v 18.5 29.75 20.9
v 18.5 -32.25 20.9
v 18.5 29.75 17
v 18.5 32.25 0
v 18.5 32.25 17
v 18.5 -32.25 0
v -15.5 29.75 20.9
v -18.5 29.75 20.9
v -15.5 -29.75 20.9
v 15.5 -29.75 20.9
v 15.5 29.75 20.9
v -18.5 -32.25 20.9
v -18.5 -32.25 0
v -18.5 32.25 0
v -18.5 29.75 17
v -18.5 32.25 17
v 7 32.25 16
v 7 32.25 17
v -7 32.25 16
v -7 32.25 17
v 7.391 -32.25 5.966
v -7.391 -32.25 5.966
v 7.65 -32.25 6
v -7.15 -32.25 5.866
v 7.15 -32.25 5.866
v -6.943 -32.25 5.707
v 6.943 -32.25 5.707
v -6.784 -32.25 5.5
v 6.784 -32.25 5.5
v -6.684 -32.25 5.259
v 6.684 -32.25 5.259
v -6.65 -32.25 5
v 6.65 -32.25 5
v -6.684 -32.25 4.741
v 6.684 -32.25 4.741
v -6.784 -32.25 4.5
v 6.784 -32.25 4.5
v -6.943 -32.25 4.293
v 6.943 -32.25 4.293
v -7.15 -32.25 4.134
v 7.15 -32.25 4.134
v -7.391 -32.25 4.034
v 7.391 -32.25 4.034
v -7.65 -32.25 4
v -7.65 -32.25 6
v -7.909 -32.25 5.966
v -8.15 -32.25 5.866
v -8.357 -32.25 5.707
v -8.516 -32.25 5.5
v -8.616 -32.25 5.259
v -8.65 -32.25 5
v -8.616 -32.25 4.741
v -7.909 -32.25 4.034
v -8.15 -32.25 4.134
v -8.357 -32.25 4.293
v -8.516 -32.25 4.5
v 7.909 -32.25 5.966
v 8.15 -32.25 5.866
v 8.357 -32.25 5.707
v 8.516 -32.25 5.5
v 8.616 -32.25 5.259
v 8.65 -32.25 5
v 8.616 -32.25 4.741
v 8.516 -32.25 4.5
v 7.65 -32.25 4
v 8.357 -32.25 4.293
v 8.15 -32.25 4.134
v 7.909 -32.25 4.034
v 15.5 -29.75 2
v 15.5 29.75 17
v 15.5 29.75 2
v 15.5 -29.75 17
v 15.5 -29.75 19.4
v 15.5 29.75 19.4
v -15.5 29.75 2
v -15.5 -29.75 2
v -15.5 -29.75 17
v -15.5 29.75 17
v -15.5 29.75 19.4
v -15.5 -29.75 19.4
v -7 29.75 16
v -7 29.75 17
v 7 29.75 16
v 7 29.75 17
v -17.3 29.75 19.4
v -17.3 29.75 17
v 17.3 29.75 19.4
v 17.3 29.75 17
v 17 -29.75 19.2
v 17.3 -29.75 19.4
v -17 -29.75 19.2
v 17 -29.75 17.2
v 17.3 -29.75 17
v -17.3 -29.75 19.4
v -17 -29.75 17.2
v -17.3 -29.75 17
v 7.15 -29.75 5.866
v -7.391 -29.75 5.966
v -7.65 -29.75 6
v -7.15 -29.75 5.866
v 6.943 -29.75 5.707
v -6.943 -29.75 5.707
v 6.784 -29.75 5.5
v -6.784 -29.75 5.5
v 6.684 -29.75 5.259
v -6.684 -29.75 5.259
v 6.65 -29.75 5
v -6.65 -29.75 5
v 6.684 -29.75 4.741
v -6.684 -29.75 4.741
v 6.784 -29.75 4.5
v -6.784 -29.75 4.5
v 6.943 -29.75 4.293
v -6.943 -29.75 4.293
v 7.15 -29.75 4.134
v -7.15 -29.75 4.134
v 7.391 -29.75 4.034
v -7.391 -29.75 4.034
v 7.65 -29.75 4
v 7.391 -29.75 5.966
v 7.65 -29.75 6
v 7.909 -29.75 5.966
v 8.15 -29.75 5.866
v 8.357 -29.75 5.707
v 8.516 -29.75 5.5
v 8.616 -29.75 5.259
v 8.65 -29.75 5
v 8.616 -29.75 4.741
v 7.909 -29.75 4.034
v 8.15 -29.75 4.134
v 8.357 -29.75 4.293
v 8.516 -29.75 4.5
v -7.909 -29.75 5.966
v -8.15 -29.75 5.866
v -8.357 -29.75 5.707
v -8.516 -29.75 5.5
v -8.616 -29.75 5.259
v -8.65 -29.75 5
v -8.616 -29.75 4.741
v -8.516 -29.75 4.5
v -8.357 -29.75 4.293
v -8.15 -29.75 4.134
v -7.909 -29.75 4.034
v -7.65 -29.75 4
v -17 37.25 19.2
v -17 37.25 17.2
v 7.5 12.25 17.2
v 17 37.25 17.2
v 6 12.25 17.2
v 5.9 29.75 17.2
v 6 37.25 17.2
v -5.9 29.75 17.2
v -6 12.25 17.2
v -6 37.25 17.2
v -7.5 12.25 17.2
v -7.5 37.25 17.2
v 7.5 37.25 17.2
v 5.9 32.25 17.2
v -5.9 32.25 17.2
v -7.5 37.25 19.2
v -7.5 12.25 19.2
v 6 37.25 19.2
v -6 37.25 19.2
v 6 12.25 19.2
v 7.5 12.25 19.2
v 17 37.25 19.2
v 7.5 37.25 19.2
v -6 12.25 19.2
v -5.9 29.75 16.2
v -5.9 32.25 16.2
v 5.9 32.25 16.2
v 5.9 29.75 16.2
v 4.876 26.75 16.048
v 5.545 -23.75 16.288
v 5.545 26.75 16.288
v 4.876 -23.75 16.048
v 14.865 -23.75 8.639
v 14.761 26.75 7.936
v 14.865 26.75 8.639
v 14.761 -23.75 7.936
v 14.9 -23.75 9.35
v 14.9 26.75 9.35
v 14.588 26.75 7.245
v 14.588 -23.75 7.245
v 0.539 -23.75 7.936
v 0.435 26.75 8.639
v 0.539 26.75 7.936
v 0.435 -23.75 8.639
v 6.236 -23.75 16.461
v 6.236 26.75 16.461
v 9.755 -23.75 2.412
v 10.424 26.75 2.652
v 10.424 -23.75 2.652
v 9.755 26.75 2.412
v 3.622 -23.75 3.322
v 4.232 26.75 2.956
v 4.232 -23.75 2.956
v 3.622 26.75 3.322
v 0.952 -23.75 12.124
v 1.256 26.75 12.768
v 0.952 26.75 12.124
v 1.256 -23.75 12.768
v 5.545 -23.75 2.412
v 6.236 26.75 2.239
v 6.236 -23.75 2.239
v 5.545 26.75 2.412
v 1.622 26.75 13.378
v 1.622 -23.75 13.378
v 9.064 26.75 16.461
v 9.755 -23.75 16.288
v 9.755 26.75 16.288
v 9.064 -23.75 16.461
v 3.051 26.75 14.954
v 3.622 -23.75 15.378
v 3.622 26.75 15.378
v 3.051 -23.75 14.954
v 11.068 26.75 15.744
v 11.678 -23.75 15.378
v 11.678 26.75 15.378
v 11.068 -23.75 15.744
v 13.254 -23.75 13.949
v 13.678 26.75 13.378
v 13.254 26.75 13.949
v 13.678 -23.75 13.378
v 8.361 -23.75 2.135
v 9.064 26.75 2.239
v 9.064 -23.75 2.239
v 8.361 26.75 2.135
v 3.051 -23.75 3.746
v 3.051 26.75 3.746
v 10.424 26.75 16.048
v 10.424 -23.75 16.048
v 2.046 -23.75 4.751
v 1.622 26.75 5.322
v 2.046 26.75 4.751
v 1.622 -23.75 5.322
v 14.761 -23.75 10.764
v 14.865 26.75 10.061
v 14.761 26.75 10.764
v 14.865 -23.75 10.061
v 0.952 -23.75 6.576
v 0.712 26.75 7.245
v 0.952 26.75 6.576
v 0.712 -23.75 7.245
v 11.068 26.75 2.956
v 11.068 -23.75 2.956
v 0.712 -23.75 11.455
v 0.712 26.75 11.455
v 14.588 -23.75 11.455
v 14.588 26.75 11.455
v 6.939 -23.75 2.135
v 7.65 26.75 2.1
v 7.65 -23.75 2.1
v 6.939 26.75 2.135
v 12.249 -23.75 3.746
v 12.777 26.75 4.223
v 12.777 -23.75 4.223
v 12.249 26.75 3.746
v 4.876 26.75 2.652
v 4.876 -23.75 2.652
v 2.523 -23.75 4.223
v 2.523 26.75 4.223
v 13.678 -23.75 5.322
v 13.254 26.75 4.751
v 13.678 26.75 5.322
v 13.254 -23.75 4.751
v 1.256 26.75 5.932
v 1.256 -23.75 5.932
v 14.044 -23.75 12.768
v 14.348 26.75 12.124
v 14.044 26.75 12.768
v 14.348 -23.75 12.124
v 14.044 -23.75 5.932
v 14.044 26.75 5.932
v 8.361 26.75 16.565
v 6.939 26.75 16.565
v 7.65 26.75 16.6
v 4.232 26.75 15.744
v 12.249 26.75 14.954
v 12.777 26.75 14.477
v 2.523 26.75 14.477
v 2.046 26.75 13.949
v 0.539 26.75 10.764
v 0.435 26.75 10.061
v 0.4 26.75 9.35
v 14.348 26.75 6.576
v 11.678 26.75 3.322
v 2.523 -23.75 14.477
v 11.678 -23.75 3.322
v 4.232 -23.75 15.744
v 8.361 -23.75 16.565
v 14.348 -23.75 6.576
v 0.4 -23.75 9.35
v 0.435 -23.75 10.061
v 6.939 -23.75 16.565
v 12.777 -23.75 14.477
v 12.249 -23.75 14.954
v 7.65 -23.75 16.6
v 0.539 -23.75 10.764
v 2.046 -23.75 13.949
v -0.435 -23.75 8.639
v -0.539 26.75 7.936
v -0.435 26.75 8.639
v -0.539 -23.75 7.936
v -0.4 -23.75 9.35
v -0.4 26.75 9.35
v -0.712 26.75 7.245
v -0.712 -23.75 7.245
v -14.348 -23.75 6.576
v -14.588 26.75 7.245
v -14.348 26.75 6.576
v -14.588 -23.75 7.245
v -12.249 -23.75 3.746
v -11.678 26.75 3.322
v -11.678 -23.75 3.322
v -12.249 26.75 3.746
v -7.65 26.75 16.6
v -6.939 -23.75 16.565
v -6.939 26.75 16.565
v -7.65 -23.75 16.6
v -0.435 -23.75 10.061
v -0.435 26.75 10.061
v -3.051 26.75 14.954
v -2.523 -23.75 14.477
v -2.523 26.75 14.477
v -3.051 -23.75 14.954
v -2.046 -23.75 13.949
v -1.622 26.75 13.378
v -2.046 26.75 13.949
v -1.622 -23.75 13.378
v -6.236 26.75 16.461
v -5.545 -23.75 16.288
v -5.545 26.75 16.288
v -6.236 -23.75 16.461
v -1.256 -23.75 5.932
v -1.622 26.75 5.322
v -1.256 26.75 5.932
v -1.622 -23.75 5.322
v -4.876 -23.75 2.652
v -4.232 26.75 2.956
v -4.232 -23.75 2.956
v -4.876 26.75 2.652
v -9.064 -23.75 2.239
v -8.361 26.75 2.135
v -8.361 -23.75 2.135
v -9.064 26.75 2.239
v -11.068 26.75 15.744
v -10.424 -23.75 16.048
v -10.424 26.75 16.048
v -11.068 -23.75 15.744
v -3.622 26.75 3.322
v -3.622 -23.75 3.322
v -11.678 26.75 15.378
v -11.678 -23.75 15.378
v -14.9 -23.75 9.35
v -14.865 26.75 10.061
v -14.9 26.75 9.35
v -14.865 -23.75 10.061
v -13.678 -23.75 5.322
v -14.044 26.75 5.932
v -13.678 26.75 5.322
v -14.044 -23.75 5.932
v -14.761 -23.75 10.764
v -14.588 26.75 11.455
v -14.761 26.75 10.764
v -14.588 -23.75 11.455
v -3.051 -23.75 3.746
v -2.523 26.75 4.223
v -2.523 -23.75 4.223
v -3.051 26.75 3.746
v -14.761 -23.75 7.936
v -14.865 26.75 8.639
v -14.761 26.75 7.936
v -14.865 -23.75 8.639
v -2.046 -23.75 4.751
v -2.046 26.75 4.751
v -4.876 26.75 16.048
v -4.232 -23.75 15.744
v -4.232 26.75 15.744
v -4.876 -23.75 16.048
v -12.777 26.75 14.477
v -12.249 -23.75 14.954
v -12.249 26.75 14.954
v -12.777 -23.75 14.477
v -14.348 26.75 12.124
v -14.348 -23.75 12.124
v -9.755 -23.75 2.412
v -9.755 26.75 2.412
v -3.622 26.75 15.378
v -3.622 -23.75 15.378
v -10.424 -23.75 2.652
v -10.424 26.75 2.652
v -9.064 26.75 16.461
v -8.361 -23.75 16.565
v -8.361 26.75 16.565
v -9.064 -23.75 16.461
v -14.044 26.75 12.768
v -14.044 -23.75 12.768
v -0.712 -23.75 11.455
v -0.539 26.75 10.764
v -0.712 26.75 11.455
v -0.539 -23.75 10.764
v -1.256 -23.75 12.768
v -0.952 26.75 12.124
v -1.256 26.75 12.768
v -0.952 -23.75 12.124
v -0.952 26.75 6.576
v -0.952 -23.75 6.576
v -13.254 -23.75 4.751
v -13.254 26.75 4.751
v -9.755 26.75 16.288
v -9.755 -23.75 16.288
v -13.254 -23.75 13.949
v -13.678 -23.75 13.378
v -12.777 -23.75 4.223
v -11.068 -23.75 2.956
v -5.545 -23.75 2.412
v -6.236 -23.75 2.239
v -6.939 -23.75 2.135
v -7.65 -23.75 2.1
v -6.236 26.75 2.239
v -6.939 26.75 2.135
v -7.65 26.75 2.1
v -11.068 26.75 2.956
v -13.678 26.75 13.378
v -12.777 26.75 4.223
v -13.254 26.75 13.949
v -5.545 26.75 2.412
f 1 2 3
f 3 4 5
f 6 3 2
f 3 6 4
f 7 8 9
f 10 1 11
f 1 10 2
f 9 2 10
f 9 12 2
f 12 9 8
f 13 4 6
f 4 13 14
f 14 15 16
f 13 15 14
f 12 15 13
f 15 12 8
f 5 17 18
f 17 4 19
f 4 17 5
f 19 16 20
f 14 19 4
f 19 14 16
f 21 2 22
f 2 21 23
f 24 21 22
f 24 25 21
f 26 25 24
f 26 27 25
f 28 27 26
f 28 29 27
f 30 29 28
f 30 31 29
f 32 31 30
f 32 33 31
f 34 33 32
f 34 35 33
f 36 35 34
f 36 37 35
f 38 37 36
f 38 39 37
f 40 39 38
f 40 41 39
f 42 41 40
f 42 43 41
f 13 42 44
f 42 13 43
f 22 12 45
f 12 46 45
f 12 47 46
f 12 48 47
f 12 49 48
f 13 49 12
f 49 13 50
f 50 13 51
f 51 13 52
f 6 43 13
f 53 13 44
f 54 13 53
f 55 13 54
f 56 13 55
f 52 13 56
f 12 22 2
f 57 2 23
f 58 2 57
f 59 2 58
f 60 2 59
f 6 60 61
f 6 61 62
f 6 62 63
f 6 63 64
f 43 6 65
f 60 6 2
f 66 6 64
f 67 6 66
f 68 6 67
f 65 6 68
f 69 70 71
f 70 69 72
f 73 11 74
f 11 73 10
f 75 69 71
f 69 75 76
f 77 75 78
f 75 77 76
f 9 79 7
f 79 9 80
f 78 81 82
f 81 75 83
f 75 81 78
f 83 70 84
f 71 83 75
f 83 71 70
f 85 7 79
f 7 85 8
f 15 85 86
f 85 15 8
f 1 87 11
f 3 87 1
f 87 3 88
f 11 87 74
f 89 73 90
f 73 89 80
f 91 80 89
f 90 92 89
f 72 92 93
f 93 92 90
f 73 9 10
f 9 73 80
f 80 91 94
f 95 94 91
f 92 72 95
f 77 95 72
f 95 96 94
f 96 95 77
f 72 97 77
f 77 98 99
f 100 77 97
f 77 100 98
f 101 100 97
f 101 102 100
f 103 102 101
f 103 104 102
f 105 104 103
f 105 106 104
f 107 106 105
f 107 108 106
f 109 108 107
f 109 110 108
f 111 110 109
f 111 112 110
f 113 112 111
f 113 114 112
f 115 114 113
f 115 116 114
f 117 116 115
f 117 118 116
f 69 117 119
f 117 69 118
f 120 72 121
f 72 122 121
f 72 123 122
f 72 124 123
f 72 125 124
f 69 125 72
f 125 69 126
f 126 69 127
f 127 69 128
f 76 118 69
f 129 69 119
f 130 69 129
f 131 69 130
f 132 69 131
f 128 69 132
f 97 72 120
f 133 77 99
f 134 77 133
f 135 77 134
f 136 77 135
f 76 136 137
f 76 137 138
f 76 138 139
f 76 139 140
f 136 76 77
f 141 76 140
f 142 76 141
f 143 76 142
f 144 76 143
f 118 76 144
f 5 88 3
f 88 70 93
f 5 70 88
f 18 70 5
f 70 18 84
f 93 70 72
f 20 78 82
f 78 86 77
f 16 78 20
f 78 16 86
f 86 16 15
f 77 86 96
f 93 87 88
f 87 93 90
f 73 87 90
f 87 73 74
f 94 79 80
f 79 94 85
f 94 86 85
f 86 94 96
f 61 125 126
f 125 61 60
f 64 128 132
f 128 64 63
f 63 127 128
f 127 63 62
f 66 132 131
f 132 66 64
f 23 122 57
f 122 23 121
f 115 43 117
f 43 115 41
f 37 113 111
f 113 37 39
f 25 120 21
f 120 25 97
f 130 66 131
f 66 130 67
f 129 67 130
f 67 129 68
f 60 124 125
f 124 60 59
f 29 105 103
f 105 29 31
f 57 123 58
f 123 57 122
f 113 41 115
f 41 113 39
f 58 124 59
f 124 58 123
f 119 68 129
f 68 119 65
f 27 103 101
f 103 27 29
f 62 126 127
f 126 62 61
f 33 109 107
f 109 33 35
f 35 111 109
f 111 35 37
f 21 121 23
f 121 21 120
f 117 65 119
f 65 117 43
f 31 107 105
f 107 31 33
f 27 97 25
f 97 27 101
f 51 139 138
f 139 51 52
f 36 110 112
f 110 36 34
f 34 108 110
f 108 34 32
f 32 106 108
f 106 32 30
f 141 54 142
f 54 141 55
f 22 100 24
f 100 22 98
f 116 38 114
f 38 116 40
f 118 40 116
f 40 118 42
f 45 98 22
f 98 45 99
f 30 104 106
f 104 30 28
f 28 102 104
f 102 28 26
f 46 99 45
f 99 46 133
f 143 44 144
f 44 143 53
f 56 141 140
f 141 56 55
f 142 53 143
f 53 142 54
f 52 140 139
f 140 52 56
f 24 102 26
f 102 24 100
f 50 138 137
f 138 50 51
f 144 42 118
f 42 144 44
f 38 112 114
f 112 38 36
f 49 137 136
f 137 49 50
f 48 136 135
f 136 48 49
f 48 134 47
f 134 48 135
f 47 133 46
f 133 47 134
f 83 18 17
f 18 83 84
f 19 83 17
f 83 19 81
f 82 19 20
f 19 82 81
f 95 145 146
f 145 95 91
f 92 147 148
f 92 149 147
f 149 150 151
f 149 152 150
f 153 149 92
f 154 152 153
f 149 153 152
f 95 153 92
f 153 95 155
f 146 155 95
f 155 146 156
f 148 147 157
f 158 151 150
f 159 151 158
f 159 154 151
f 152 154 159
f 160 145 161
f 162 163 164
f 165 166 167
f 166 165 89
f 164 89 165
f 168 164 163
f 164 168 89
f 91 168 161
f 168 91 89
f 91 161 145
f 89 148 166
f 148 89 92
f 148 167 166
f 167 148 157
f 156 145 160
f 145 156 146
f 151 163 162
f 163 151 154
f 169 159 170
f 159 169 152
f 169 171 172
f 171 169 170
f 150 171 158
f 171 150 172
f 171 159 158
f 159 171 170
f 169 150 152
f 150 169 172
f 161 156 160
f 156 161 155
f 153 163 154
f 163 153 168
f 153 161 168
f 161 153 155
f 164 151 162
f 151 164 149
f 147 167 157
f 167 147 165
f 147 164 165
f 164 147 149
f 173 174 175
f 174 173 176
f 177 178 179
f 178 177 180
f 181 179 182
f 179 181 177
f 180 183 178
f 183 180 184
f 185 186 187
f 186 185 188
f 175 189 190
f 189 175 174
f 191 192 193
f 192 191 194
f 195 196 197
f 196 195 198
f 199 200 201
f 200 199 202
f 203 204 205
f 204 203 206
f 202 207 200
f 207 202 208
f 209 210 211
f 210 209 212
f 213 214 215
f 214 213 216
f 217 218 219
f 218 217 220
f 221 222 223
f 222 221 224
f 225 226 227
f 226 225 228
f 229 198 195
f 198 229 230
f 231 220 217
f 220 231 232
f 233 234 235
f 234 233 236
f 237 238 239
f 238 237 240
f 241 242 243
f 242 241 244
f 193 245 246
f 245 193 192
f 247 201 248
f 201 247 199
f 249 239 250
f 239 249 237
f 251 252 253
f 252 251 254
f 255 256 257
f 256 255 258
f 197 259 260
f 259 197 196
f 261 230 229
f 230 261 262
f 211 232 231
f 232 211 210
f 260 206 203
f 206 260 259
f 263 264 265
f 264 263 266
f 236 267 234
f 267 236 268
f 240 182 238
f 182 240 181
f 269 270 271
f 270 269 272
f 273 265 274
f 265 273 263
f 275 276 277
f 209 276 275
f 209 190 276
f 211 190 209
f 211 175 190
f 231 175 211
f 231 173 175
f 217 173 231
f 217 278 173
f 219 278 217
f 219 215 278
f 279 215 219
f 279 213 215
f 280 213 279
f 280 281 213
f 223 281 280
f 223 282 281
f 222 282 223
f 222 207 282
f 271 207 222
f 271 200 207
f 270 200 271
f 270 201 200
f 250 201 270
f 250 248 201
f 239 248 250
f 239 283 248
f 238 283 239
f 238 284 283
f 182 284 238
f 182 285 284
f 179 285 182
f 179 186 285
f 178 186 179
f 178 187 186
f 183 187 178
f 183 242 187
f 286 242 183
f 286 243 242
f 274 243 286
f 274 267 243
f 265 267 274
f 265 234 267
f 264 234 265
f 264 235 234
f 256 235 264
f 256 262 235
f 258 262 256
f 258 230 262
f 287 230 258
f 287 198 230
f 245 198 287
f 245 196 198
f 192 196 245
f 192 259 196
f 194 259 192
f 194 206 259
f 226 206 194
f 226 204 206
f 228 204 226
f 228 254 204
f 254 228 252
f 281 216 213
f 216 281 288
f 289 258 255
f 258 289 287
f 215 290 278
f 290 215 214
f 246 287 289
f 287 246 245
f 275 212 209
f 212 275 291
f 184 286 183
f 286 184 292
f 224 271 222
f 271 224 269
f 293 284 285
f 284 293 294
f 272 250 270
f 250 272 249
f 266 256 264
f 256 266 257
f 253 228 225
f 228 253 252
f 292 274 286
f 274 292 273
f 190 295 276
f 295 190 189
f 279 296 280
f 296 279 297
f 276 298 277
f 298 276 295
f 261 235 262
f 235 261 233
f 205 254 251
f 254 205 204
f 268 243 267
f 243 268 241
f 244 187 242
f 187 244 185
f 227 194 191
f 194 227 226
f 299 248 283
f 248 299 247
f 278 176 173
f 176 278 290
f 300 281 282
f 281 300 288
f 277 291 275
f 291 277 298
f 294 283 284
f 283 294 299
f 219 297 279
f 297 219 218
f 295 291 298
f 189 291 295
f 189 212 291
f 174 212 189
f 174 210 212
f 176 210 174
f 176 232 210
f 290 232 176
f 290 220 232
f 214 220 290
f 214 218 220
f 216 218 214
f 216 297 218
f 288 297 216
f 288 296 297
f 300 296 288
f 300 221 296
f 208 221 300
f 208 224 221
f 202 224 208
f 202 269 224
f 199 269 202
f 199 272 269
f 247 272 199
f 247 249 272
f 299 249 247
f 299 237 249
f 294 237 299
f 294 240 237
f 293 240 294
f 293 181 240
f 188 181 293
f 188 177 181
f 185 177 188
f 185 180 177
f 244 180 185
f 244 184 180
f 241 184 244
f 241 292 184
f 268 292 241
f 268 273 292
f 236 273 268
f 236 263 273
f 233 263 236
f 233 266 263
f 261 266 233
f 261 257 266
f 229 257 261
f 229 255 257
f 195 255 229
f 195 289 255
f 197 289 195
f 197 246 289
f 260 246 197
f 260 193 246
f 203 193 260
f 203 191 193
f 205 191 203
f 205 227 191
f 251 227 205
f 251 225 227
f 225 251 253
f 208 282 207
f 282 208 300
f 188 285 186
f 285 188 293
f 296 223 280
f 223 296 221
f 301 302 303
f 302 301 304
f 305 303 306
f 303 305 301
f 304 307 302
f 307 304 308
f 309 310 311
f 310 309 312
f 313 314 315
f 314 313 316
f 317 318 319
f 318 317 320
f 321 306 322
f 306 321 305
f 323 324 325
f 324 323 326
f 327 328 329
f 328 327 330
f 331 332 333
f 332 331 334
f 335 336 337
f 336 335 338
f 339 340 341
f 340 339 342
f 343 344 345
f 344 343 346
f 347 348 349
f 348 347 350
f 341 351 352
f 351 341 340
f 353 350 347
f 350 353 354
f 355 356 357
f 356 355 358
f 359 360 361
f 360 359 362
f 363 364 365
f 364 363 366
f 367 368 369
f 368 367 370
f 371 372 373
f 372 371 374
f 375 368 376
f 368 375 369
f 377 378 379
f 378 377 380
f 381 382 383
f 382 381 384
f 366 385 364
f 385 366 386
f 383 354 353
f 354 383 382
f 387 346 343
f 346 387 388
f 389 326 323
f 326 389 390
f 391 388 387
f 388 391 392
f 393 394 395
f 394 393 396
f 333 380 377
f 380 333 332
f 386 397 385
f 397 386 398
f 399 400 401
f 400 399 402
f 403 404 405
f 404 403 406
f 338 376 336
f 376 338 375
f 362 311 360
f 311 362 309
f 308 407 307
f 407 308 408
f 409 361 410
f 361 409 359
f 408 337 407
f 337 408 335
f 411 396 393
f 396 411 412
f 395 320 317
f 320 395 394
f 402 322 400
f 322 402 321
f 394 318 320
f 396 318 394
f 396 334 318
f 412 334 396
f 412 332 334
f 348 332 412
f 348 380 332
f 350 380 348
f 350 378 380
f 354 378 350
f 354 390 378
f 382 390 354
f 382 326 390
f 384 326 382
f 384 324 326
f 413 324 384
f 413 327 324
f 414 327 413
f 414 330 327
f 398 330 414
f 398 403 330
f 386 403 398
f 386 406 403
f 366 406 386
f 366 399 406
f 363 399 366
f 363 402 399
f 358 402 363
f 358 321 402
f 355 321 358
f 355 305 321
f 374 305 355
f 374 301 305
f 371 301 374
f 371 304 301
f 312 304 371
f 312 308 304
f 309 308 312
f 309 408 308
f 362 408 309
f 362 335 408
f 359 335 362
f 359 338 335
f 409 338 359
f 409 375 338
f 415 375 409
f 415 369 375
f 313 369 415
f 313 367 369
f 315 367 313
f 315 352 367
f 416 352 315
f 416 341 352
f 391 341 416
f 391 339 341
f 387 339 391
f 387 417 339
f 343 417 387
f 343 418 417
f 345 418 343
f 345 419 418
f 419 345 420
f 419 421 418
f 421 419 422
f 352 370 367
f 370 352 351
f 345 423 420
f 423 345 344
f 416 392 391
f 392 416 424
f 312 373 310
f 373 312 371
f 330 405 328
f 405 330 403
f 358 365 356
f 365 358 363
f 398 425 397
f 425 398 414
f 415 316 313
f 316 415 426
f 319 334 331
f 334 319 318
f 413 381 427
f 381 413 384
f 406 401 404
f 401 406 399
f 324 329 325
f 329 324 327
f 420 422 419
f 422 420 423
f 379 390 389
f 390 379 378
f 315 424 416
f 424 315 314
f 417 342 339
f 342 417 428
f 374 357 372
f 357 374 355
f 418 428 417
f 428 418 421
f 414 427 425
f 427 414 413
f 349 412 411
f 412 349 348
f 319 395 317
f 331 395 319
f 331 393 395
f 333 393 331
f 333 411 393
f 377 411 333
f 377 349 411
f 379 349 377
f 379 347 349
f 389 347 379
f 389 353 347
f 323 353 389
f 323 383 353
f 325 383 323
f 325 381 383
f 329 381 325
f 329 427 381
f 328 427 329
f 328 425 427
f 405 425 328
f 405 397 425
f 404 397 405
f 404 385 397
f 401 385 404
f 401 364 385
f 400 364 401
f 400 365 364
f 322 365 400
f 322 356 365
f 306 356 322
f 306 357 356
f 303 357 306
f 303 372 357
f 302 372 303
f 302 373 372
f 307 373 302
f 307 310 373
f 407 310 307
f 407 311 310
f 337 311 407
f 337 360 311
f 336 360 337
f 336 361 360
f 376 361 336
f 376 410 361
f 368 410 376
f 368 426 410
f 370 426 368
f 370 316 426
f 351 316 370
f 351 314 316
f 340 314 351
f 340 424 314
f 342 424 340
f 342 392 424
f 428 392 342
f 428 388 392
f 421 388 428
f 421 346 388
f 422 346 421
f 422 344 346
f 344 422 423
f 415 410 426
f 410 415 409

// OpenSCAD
/* Holder for two AA batteries with sliding cover.
   PLA, 0.4mm nozzle, no supports. Units mm.
   Print orientation: +Z up, parts rest on min z.
*/

// ---------- parameters ----------
battery_d = 14.5;
battery_l = 50.5;
side_gap = 0.6;      // battery side to wall
mid_gap = 0.8;       // between batteries
Wi = 2*battery_d + mid_gap + 2*side_gap; // 31.0 interior width
Li = battery_l + 3 + 6;                  // 59.5 interior length
floor_t = 2.0;
side_t = 3.0;
end_t = 2.5;
Wext = Wi + 2*side_t;   // 37
Lext = Li + 2*end_t;    // 64.5
wall_top = 20.9;
low_top = 17.0;
groove_bottom = 17.0;
groove_h = 2.4;
groove_top = groove_bottom + groove_h; // 19.4
groove_depth = 1.8;
engage = 1.5;
Wc = Wi + 2*engage;     // 34 cover width
Lc0 = Lext;             // 64.5 main length
lip_len = 5.0;
Lc = Lc0 + lip_len;     // 69.5 total cover length
y0b = -Lext/2;          // -32.25 base min y
y1b = Lext/2;           // 32.25 base max y
y0c = -Lext/2;          // -32.25 cover min y
y1c = Lext/2 + lip_len; // 37.25 cover max y
tc = 2.0;
finger_w = 12;
slot_w = 1.5;
finger_y0 = 12.25;
tooth_w = 11.8;
tooth_yl = 2.5;
tooth_y0 = 29.75;
tooth_y1 = tooth_y0 + tooth_yl; // 32.25
tooth_h = 1.0;
notch_hw = 7;
notch_y0 = 29.65;
notch_y1 = 32.35;
notch_bot = 16.0;
bx = battery_d/2 + mid_gap/2; // 7.65 battery center x
battery_y0 = -Li/2 + 6;       // -23.75 spring side
battery_y1 = battery_y0 + battery_l; // 26.75
battery_yc = (battery_y0 + battery_y1)/2; // 1.5
battery_zc = floor_t + battery_d/2 + 0.1; // 9.35 slight lift
wire_z = 5;
wire_r = 1.0;

part = "assembly"; // [base, cover, assembly]
cadverify_only = "";
module instance(name, part, unit = 1) {
    echo(cadverify_instance = [name, part, unit]);
    if (cadverify_only == "" || cadverify_only == name) children();
}

module battery() {
    rotate([-90,0,0])
        cylinder(d=battery_d, h=battery_l, center=true, $fn=64);
}

module base() {
    difference() {
        // outer solid
        translate([-Wext/2, y0b, 0])
            cube([Wext, Lext, wall_top]);
        // interior cavity open at top
        translate([-Wi/2, -Li/2, floor_t])
            cube([Wi, Li, wall_top - floor_t + 1]);
        // low end wall cut (+Y end)
        translate([-Wext/2, Li/2, low_top])
            cube([Wext, Lext/2 - Li/2 + 0.5, wall_top - low_top + 1]);
        // left groove
        translate([Wi/2, -Li/2, groove_bottom])
            cube([groove_depth, Li/2 + Lext/2 + 0.5, groove_h]);
        // right groove
        translate([-Wi/2 - groove_depth, -Li/2, groove_bottom])
            cube([groove_depth, Li/2 + Lext/2 + 0.5, groove_h]);
        // wire holes through spring (-Y) wall
        translate([bx, y0b - 1, wire_z])
            rotate([-90,0,0])
                cylinder(r=wire_r, h=end_t + 2, $fn=24);
        translate([-bx, y0b - 1, wire_z])
            rotate([-90,0,0])
                cylinder(r=wire_r, h=end_t + 2, $fn=24);
        // latch notch in low wall top
        translate([-notch_hw, notch_y0, notch_bot])
            cube([2*notch_hw, notch_y1 - notch_y0, low_top - notch_bot + 0.02]);
    }
}

module cover() {
    // print orientation: plate 0..tc, tooth on top tc..tc+tooth_h
    difference() {
        union() {
            translate([-Wc/2, y0c, 0])
                cube([Wc, Lc, tc]);
            // latch tooth on top (becomes bottom after flip)
            translate([-tooth_w/2, tooth_y0, tc])
                cube([tooth_w, tooth_yl, tooth_h]);
        }
        // finger slots, open at +Y lip end
        translate([finger_w/2, finger_y0, -0.5])
            cube([slot_w, y1c - finger_y0 + 0.5, tc + 1.5]);
        translate([-finger_w/2 - slot_w, finger_y0, -0.5])
            cube([slot_w, y1c - finger_y0 + 0.5, tc + 1.5]);
    }
}

module assembly() {
    instance("base", "base", 1) base();
    instance("battery_left", "external", 1)
        translate([bx, battery_yc, battery_zc]) battery();
    instance("battery_right", "external", 1)
        translate([-bx, battery_yc, battery_zc]) battery();
    // cover printed upside-down: rotate 180 about Y then lift
    instance("cover", "cover", 1)
        translate([0, 0, 19.2]) rotate([0,180,0]) cover();
}

// ---------- specs ----------
if (part == "base") {
    echo(cadverify_spec = [
        ["bounds", [[-Wext/2, y0b, 0], [Wext/2, y1b, wall_top]]],
        ["bodies", 1],
        ["through_holes", 2],
        ["support_faces", [["bottom", "-z", 2000]]],
        ["overhangs_allowed", [
            ["groove ceilings bridge 3.6mm", [[Wi/2 - 0.6, -Li/2 - 0.5, groove_bottom - 0.5], [Wi/2 + groove_depth + 0.5, y1b + 0.2, groove_top + 0.6]]],
            ["groove ceilings bridge 3.6mm", [[-Wi/2 - groove_depth - 0.5, -Li/2 - 0.5, groove_bottom - 0.5], [-Wi/2 + 0.6, y1b + 0.2, groove_top + 0.6]]],
            ["wire holes 2mm dia bridges", [[-10, y0b - 0.5, wire_z - 1.5], [10, -Li/2 + 0.5, wire_z + 1.5]]]
        ]],
        ["copies", 1],
        ["details", [
            ["cavity", "void", [[-Wi/2, -Li/2, floor_t], [Wi/2, Li/2, 17]], 0.9],
            ["spring_room", "void", [[-Wi/2, -Li/2, floor_t], [Wi/2, -Li/2 + 6, 16.6]], 0.9],
            ["pos_room", "void", [[-Wi/2, Li/2 - 3, floor_t], [Wi/2, Li/2, 16.6]], 0.9],
            ["groove_left", "void", [[Wi/2, -Li/2, groove_bottom], [Wi/2 + groove_depth, y1b, groove_top]], 0.85],
            ["groove_right", "void", [[-Wi/2 - groove_depth, -Li/2, groove_bottom], [-Wi/2, y1b, groove_top]], 0.85],
            ["notch", "void", [[-notch_hw, notch_y0, notch_bot], [notch_hw, notch_y1, low_top + 0.02]], 0.85],
            ["wire1", "hole", [bx, y0b - 1, wire_z], [0, 1, 0], [[0, 2], [2, 2]]],
            ["wire2", "hole", [-bx, y0b - 1, wire_z], [0, 1, 0], [[0, 2], [2, 2]]],
            ["floor", "thickness", [0, 0, -1], [0, 0, 1], 2.0],
            ["side_wall", "thickness", [Wext/2 + 1, 0, 18.2], [-1, 0, 0], 1.2],
            ["end_wall", "thickness", [0, y1b + 1, 10], [0, -1, 0], 2.5]
        ]]
    ]);
    base();
} else if (part == "cover") {
    echo(cadverify_spec = [
        ["bounds", [[-Wc/2, y0c, 0], [Wc/2, y1c, tc + tooth_h]]],
        ["bodies", 1],
        ["through_holes", 0],
        ["support_faces", [["bottom", "-z", 1500]]],
        ["overhangs_allowed", []],
        ["copies", 1],
        ["details", [
            ["plate", "thickness", [0, -10, -1], [0, 0, 1], 2.0],
            ["finger", "material", [[-finger_w/2, finger_y0, 0], [finger_w/2, y1c, tc]], 0.85],
            ["slot_left", "void", [[finger_w/2, finger_y0, -0.5], [finger_w/2 + slot_w, y1c + 0.01, tc + 0.5]], 0.85],
            ["slot_right", "void", [[-finger_w/2 - slot_w, finger_y0, -0.5], [-finger_w/2, y1c + 0.01, tc + 0.5]], 0.85],
            ["tooth", "material", [[-tooth_w/2, tooth_y0, tc], [tooth_w/2, tooth_y1, tc + tooth_h]], 0.85],
            ["lip", "material", [[-Wc/2, y1b, 0], [Wc/2, y1c, tc]], 0.9]
        ]]
    ]);
    cover();
} else if (part == "assembly") {
    echo(cadverify_spec = [
        ["bounds", [[-Wext/2, y0b, 0], [Wext/2, y1c, wall_top]]],
        ["support_faces", [["bottom", "-z", 2000]]],
        ["allowed_interferences", []],
        ["motions", [
            ["slide_cover", ["cover"], "slide", [0, 1, 0], [0, 50], ["flex", [["cover", "base", 1.0, "latch tooth rides over end wall"]]]]
        ]],
        ["assembly_order", [
            [["base"], [0, 0, 0]],
            [["battery_left"], [0, 0, -1]],
            [["battery_right"], [0, 0, -1]],
            [["cover"], [0, -1, 0]]
        ]]
    ]);
    assembly();
}
